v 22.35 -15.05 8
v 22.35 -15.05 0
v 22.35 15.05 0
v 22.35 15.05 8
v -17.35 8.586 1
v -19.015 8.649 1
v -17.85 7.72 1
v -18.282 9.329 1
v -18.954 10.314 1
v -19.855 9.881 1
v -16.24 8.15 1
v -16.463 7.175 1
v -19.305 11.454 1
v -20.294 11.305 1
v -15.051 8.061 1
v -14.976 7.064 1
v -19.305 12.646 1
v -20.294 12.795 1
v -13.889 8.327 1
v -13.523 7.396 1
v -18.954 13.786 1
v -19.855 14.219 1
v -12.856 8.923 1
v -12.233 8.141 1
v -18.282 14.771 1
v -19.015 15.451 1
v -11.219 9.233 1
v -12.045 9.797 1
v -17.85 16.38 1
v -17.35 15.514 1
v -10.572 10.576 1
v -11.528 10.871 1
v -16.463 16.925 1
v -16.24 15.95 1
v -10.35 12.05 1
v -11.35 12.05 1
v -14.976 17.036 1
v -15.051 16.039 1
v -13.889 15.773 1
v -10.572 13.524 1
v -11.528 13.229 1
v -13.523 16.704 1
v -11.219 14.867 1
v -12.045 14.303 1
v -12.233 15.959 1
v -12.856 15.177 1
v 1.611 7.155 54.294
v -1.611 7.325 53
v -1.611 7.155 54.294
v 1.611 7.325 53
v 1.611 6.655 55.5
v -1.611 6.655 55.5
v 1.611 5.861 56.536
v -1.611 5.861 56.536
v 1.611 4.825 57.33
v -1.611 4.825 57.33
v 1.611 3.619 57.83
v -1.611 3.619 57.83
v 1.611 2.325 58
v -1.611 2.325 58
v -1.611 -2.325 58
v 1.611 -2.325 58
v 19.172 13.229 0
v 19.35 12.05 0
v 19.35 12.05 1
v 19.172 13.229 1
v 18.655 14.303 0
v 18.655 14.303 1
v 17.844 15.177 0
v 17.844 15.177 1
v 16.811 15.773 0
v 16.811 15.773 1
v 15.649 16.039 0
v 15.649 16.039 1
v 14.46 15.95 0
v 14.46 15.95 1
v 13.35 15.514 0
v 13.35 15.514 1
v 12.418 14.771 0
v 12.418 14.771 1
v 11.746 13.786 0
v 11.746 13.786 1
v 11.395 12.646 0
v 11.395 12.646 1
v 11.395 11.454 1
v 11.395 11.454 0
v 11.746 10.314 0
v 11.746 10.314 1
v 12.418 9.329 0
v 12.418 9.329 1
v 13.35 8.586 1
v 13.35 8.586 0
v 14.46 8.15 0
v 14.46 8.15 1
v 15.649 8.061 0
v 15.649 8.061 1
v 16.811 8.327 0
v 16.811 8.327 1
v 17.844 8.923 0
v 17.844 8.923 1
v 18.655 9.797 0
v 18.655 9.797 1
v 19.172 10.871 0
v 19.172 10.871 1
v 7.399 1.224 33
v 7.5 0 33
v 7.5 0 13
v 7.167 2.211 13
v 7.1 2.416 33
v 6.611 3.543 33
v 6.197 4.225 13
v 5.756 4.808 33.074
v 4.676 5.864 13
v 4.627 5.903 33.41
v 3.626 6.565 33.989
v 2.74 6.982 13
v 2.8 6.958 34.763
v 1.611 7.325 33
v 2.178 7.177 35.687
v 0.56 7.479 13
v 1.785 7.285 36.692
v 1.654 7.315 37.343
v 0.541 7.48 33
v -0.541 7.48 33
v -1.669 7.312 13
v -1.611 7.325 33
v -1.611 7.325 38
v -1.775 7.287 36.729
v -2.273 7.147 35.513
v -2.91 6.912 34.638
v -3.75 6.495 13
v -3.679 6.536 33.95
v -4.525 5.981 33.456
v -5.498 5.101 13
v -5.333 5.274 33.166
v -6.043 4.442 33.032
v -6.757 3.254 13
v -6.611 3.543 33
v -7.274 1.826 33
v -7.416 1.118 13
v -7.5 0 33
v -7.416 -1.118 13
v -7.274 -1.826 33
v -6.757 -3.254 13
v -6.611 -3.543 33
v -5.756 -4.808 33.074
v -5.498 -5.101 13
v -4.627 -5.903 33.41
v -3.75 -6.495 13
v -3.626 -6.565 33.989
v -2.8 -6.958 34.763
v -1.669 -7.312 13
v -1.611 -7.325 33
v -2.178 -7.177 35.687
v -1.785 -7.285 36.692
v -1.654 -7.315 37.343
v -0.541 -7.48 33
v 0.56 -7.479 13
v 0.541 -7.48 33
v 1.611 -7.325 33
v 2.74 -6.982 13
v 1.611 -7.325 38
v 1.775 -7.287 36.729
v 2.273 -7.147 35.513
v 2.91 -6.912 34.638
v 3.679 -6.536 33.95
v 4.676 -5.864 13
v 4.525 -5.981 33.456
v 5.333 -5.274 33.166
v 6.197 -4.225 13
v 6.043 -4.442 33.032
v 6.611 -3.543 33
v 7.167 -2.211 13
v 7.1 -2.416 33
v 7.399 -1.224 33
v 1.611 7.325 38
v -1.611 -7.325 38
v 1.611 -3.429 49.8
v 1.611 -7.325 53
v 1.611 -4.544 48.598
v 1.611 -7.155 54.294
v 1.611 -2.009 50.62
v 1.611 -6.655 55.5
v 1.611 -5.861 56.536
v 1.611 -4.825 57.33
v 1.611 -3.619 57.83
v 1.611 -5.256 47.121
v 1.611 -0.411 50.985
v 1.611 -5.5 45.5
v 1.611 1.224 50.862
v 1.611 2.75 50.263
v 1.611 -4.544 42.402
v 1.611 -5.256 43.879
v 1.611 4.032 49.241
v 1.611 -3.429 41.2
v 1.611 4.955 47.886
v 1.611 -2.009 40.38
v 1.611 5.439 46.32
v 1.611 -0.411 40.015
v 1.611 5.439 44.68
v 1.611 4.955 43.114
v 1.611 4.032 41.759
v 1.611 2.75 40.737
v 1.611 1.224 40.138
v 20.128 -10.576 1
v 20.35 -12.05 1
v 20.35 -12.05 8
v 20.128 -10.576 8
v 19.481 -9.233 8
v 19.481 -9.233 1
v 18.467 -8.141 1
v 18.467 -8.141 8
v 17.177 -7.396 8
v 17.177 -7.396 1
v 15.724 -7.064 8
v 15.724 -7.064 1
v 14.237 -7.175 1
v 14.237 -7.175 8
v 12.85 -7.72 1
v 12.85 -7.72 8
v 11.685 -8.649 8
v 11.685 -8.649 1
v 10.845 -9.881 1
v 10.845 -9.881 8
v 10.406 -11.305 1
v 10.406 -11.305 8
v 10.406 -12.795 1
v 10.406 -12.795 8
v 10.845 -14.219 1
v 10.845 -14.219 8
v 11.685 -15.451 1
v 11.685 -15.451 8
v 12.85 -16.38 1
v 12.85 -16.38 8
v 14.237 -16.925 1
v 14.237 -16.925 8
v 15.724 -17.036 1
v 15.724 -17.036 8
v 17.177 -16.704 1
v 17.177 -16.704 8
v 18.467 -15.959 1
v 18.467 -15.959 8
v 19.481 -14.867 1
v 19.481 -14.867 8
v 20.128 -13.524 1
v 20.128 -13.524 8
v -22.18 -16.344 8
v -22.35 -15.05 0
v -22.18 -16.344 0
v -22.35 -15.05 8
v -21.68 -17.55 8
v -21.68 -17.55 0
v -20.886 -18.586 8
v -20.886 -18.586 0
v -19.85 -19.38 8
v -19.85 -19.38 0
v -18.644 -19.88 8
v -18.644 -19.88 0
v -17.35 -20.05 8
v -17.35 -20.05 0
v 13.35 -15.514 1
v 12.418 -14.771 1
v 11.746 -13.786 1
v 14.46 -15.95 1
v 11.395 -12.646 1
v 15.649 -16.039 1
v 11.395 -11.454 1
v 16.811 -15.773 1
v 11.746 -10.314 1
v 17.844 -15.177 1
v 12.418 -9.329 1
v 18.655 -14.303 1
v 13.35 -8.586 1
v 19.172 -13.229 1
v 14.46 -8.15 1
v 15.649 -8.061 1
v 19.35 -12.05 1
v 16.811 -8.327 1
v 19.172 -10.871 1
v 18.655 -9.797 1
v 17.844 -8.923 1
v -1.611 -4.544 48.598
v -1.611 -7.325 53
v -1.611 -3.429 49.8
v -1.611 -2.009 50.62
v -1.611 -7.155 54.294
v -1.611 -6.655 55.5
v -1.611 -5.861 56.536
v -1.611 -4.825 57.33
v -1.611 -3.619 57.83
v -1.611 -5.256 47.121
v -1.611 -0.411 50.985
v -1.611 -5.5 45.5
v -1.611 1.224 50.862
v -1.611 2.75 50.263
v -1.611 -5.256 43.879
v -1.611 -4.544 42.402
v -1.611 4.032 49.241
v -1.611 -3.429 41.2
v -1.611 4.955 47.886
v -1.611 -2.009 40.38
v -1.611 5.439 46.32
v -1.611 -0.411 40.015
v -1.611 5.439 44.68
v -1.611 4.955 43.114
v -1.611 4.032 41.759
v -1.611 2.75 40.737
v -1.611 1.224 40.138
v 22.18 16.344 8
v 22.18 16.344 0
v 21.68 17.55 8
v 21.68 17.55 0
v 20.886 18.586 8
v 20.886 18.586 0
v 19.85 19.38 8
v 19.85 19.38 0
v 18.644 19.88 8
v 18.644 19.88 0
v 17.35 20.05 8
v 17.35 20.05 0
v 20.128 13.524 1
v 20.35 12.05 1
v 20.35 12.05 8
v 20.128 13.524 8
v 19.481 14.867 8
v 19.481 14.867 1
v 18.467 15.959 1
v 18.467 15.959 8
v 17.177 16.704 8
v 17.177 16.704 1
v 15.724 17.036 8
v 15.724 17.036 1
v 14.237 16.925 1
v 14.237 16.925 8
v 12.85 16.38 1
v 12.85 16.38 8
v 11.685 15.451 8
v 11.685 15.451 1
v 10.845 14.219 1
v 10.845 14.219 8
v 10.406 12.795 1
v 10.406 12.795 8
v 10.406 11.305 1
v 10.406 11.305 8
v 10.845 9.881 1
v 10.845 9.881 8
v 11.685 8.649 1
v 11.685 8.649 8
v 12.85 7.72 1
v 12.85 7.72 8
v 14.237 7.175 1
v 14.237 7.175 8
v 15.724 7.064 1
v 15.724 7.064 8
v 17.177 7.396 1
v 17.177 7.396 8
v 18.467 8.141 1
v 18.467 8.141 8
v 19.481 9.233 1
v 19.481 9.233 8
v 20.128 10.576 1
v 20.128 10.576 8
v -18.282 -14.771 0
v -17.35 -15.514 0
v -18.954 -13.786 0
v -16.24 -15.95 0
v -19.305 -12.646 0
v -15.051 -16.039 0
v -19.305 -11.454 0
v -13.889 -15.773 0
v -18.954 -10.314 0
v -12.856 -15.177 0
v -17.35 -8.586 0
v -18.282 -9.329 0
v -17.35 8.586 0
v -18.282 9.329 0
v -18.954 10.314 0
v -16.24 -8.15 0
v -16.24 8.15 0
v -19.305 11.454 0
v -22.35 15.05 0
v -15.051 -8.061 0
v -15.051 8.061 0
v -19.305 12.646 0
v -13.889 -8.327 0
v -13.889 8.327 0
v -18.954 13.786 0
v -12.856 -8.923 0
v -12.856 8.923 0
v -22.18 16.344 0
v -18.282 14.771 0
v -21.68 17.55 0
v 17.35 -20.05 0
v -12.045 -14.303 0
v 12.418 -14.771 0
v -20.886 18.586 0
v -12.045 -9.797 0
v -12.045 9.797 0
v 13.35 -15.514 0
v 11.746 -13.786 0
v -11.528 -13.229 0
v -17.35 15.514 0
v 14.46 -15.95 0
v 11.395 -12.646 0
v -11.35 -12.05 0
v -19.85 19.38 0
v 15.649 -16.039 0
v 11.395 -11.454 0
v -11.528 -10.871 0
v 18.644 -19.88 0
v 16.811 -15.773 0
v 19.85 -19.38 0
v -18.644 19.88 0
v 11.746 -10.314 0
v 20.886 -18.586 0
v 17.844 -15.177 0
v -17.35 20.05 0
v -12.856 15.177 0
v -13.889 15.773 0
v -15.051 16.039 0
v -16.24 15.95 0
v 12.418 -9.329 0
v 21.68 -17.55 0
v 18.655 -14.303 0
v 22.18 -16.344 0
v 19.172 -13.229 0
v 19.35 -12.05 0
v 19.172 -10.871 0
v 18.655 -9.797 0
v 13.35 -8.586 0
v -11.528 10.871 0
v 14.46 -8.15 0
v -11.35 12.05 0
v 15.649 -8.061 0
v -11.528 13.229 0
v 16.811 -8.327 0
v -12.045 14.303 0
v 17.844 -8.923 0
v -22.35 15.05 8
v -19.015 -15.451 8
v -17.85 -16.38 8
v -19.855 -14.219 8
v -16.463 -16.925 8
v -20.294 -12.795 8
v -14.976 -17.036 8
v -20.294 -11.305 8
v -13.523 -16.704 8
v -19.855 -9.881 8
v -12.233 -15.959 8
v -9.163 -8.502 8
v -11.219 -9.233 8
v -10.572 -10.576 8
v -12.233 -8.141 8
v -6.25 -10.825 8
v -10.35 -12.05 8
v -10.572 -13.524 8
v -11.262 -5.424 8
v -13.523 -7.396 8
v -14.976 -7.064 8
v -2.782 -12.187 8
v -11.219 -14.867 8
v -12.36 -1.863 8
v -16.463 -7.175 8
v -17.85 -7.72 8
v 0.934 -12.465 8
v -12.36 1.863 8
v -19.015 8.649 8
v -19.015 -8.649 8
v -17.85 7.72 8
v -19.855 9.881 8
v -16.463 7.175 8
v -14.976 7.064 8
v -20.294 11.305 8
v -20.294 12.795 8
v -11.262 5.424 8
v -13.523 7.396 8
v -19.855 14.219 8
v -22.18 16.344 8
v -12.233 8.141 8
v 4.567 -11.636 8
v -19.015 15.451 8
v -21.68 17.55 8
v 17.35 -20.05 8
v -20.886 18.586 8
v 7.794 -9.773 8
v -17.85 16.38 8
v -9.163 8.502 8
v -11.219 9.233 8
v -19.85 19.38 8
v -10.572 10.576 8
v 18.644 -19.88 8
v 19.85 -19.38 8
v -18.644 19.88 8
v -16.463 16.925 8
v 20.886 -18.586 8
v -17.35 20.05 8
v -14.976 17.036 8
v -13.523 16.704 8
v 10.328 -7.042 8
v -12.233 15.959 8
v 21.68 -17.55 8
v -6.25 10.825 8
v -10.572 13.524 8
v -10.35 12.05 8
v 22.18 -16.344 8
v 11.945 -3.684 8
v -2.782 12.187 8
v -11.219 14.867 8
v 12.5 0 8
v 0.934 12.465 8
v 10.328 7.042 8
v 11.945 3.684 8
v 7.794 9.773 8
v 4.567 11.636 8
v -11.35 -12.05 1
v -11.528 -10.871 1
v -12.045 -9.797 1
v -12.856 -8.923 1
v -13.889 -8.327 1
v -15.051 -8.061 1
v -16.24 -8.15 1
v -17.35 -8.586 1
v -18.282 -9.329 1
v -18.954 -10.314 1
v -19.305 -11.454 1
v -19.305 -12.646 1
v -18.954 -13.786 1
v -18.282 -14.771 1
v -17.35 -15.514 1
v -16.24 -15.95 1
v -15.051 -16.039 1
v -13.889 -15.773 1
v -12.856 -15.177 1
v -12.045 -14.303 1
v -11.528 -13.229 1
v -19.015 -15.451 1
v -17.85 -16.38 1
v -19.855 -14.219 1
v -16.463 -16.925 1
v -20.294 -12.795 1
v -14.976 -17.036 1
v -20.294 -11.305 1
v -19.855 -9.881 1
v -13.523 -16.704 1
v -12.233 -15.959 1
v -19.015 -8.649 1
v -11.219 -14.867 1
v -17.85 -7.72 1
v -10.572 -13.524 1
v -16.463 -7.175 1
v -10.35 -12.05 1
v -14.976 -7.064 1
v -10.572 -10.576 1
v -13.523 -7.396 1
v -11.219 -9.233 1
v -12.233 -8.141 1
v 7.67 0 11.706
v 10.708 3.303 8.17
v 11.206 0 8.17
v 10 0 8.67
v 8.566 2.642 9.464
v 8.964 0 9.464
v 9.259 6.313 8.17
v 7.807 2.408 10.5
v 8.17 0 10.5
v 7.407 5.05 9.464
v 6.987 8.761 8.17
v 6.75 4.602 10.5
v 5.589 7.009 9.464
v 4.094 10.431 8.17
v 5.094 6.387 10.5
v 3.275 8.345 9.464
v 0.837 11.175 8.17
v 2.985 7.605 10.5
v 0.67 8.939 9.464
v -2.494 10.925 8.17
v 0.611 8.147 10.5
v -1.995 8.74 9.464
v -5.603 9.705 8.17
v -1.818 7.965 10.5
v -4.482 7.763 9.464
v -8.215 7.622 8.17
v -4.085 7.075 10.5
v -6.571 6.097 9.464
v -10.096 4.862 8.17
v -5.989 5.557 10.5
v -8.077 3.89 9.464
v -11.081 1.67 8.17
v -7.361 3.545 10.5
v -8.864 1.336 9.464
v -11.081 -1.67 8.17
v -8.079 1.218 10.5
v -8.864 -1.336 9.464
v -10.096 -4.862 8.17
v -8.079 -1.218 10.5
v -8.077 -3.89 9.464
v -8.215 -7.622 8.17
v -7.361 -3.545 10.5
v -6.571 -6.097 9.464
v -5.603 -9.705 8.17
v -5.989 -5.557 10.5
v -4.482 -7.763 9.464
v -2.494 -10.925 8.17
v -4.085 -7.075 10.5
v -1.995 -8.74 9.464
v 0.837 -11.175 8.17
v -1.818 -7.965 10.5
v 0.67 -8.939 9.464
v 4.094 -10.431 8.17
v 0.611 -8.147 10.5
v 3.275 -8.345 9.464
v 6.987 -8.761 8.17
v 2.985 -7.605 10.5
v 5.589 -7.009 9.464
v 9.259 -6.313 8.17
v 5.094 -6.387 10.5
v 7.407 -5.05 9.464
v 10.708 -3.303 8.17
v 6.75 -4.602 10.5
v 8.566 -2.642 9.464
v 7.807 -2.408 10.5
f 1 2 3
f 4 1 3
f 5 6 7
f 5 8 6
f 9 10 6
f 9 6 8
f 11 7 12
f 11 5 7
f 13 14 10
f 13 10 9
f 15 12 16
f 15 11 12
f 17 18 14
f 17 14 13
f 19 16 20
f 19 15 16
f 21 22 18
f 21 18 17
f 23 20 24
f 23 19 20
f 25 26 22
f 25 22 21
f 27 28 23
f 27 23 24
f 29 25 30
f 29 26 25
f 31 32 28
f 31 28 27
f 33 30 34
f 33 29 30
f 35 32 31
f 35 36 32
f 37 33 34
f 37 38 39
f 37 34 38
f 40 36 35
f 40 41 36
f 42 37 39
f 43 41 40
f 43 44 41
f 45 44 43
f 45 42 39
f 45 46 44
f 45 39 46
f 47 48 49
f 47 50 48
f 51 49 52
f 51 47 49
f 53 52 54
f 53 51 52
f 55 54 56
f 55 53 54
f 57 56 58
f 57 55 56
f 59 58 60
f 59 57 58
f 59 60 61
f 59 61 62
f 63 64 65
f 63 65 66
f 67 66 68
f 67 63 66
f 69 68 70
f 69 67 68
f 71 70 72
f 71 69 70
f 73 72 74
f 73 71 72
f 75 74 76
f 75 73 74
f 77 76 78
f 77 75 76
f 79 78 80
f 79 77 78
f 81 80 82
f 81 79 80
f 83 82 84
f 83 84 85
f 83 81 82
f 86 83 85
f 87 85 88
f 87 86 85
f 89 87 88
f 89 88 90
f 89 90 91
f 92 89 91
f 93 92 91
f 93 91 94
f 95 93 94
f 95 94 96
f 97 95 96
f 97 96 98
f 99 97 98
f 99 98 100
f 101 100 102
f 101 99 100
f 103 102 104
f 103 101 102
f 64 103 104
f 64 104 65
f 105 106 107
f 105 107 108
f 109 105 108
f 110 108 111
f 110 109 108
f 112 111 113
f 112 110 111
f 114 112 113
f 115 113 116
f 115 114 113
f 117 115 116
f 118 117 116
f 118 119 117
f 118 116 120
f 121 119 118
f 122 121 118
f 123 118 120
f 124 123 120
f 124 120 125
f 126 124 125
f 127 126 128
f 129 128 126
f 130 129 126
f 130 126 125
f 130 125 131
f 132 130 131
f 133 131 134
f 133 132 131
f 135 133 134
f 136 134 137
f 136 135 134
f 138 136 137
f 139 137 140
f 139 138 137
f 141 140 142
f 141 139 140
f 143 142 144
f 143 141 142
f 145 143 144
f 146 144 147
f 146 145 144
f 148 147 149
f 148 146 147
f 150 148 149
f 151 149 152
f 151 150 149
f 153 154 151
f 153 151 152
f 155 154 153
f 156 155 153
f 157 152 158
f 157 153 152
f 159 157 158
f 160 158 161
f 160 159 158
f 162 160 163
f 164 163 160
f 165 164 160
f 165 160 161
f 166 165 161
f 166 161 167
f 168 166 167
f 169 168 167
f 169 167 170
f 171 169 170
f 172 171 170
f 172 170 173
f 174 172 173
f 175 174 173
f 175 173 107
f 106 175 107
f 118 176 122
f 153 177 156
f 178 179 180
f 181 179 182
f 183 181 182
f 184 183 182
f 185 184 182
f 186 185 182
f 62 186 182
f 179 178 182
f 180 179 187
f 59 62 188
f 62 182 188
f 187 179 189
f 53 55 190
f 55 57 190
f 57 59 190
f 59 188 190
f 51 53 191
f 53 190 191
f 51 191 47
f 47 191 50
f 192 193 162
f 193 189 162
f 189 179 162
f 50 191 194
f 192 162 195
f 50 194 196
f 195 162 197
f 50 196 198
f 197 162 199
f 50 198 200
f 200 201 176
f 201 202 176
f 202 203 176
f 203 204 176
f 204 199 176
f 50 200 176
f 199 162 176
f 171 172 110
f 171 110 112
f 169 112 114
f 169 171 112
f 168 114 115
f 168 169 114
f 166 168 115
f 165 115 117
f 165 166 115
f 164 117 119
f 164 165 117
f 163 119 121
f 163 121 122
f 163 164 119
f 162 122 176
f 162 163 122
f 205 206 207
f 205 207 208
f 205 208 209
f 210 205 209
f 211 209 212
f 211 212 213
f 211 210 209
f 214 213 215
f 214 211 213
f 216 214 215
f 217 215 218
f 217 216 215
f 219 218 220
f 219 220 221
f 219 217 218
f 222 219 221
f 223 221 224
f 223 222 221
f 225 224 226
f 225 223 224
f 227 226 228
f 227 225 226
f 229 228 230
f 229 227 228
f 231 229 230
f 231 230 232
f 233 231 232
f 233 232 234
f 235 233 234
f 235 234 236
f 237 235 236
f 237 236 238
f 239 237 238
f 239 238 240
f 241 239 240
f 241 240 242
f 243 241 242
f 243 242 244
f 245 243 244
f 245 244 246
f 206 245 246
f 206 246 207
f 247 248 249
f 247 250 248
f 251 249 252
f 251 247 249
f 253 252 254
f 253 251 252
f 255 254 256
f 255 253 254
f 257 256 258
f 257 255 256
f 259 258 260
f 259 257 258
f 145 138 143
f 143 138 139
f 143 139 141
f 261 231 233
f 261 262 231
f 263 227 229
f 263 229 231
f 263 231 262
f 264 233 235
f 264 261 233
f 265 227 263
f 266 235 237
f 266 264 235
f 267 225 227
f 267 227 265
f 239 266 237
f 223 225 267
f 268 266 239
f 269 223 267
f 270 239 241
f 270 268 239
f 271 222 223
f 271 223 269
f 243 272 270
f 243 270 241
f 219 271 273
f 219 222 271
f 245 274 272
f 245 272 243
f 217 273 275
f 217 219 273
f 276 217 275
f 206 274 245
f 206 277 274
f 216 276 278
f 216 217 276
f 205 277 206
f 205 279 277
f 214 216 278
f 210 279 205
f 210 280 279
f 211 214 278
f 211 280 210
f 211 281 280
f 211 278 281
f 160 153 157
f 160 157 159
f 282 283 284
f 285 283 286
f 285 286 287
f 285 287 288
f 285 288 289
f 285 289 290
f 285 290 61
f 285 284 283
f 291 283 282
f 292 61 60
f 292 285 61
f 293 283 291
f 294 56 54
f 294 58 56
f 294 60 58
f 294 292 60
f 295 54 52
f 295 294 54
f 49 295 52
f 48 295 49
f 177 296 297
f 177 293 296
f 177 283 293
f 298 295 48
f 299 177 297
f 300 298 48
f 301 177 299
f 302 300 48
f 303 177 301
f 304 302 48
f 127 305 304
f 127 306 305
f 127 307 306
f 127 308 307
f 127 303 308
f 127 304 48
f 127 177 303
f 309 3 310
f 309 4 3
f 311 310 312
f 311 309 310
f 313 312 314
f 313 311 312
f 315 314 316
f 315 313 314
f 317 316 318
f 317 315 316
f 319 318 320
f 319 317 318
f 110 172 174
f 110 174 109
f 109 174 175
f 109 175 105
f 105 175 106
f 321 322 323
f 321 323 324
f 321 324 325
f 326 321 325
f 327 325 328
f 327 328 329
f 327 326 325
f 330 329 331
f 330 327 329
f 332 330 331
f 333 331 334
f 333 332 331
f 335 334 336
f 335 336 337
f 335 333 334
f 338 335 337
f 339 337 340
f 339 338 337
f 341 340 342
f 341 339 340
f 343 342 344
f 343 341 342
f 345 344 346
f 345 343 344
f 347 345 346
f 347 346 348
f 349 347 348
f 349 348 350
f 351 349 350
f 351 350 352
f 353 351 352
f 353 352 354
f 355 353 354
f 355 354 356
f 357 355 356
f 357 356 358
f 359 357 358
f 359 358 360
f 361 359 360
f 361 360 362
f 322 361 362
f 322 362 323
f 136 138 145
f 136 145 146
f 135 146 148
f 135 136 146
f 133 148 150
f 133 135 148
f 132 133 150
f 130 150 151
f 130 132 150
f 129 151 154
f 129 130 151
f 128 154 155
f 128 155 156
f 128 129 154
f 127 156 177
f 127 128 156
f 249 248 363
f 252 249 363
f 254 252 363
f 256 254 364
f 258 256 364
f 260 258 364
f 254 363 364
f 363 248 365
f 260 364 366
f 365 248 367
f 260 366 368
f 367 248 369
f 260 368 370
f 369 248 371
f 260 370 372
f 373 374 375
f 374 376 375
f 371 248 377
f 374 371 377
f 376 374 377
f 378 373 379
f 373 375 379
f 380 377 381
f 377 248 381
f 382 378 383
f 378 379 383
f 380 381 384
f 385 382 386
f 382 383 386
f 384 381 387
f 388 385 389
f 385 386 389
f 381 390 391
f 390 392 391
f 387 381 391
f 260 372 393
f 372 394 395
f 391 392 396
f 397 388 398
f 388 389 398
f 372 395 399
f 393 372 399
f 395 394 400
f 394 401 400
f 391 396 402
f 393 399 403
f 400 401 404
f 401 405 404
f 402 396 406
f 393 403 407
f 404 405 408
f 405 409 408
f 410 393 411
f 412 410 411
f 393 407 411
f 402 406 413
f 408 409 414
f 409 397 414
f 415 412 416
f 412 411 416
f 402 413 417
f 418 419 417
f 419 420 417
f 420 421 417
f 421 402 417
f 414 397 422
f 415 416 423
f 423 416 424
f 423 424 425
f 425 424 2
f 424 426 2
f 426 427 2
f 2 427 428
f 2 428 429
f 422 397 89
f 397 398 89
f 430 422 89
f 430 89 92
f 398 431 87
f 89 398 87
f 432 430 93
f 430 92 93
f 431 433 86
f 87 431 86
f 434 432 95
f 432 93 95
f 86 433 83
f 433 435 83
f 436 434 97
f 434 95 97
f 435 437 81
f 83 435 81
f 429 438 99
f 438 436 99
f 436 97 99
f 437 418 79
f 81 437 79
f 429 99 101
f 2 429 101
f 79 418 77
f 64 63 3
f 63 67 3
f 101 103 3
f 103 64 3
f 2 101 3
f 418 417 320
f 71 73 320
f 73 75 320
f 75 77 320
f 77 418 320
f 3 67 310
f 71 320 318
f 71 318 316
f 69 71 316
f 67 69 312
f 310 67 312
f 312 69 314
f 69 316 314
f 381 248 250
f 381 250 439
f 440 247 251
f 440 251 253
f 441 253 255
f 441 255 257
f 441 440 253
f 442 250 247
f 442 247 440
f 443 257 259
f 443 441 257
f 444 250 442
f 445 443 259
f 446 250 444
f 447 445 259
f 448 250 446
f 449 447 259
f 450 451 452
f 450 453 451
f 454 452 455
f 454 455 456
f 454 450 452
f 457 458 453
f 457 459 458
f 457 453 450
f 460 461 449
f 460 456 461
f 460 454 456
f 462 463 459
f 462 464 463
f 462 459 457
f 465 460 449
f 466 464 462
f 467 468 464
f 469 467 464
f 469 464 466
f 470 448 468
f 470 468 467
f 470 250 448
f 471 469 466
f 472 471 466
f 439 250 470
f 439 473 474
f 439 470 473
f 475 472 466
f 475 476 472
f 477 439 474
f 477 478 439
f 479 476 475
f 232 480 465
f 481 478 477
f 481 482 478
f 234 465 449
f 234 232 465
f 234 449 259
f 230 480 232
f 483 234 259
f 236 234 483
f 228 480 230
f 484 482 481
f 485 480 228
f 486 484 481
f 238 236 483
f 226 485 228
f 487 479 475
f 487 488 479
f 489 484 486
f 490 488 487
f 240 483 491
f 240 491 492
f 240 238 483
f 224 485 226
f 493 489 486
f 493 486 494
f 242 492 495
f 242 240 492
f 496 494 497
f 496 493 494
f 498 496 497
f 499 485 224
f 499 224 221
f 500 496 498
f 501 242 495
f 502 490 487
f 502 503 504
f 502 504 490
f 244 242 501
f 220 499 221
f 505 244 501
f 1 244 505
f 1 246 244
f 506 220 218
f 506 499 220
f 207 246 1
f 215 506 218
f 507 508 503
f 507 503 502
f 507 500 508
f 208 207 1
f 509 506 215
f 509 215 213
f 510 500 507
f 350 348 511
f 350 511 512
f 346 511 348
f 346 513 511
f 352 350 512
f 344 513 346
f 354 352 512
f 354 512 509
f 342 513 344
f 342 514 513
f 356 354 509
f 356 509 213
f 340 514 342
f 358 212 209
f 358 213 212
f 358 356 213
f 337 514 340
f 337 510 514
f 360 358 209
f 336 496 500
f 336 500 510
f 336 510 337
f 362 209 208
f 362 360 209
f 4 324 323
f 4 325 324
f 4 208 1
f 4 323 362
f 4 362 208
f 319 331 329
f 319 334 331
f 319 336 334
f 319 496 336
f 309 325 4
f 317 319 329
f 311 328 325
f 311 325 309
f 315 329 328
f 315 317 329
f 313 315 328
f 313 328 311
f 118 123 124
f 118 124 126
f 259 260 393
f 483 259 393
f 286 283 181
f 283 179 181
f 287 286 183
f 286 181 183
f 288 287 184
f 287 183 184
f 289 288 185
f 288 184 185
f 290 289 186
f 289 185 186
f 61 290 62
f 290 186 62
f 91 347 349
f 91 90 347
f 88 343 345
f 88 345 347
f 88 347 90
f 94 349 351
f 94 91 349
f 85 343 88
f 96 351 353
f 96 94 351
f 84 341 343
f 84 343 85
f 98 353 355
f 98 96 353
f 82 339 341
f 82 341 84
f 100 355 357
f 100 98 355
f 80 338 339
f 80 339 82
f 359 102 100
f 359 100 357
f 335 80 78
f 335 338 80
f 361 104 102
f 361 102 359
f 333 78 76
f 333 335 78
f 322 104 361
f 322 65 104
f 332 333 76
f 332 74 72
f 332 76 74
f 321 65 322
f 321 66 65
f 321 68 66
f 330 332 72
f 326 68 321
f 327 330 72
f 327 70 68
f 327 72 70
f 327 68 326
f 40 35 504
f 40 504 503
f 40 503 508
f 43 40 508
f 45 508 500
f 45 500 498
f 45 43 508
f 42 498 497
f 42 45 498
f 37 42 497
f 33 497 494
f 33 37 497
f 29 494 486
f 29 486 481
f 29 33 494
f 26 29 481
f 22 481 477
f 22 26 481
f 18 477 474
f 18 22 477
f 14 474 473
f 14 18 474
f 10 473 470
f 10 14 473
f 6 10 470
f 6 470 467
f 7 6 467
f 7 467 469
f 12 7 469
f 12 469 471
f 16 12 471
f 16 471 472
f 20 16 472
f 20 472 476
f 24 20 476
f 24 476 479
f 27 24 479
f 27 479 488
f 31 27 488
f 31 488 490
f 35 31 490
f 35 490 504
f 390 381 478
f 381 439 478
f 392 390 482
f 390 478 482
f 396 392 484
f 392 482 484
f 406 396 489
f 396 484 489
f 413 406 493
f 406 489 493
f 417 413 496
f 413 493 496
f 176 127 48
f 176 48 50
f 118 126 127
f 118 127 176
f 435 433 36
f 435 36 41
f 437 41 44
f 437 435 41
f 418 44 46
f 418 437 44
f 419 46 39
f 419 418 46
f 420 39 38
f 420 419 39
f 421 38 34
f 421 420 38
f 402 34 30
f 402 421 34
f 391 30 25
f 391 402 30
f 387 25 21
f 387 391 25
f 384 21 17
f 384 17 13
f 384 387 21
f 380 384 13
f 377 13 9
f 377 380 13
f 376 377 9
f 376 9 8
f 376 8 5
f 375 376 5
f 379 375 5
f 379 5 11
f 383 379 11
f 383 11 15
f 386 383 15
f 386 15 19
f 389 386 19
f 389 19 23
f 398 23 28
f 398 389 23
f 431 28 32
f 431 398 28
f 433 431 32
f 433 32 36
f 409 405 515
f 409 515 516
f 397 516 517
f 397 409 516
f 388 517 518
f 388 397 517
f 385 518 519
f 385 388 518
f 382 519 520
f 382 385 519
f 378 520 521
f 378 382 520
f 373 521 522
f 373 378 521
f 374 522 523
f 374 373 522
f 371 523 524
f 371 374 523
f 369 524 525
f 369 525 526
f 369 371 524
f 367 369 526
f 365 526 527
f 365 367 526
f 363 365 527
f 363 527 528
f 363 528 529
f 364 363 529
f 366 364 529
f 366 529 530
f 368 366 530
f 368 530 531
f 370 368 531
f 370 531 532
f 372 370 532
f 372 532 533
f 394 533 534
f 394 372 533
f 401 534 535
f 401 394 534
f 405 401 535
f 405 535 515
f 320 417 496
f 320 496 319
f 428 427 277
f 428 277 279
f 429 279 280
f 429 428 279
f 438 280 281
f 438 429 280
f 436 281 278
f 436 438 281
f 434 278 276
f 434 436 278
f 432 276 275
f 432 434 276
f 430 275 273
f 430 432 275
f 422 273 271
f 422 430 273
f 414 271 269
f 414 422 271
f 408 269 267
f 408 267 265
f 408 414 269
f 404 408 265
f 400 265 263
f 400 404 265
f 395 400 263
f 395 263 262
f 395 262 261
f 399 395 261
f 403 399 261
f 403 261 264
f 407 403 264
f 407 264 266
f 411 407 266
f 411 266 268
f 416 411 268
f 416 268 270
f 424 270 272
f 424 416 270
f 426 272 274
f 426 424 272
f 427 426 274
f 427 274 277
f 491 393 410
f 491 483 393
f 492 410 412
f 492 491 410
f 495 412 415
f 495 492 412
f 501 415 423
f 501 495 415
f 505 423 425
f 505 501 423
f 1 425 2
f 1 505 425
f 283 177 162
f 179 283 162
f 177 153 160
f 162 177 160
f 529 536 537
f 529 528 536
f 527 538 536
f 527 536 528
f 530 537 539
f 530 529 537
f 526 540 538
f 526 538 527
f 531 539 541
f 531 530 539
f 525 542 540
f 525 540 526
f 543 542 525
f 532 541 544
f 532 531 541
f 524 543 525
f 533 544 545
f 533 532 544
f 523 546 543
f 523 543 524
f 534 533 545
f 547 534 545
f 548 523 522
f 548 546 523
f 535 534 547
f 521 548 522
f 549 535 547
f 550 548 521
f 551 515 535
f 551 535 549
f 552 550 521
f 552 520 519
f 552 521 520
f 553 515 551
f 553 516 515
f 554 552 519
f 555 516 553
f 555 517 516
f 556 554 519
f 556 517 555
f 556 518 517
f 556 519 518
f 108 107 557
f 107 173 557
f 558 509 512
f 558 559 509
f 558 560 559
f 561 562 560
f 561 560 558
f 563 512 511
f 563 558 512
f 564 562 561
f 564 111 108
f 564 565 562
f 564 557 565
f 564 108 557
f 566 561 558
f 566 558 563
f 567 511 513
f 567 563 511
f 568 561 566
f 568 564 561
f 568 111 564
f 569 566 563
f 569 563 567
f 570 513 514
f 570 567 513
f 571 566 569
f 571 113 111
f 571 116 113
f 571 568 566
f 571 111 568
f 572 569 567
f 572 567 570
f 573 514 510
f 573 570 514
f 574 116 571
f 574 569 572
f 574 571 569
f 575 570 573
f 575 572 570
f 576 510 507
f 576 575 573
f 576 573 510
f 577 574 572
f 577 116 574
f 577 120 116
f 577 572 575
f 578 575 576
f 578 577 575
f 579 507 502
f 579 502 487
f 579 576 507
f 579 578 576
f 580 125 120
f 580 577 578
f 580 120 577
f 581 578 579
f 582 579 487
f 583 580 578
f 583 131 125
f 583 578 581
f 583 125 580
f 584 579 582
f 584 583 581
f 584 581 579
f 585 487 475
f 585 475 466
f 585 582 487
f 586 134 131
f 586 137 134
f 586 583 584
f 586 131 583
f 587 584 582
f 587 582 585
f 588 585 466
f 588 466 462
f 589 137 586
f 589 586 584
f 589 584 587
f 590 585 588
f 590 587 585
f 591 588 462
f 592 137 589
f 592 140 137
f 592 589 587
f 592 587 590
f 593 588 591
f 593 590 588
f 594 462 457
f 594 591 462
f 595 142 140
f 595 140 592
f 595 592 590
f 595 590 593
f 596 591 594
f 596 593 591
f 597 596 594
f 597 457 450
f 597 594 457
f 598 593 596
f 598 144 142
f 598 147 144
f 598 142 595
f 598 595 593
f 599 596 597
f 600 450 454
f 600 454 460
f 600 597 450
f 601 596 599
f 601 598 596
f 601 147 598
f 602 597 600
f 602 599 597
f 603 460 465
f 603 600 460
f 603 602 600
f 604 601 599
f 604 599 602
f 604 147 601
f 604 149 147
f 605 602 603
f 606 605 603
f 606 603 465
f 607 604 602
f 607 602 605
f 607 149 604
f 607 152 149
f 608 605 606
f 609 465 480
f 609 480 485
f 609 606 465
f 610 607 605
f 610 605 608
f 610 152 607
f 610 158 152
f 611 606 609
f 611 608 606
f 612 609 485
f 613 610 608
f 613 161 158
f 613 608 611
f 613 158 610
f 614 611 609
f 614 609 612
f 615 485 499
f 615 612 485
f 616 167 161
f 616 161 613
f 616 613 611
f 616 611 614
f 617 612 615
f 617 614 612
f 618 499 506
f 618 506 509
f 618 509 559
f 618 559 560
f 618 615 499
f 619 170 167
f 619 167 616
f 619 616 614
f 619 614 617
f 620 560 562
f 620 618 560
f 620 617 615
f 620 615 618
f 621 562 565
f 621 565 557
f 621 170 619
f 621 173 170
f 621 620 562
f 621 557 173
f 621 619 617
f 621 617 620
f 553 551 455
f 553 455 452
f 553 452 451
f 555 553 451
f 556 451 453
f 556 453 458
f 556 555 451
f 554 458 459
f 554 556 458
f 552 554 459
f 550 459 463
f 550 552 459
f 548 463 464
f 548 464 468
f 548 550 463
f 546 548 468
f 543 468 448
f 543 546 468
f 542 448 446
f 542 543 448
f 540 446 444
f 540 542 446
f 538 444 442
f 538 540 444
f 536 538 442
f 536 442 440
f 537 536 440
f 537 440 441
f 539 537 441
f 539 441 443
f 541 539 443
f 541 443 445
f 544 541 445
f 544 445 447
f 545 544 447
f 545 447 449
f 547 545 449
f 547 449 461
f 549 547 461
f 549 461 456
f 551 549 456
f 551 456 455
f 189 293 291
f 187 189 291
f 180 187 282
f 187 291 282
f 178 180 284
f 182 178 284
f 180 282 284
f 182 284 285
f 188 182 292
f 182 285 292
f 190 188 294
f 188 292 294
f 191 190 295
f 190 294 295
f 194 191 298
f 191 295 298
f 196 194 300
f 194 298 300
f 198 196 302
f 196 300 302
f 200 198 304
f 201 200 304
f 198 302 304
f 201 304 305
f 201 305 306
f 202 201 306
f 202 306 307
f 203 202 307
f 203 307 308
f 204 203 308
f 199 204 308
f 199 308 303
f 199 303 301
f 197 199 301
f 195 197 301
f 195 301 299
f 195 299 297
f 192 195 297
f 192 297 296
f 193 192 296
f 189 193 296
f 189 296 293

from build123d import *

# Parameters (mm, degrees)
F0_W          = 44.7
F0_H          = 40.1
F0_R          = 5
F1_DEPTH      = 8
F0_R_2        = 4
F2_DEPTH      = 1
F3_R          = 7.5
F4_DEPTH      = 25
F5_W          = 3.2212789527
F5_H          = 14.6500294167
F6_DEPTH      = 25
F7_R          = 5.5
F8_DEPTH      = 10
F9_R          = 5
F10_T4_DEPTH  = 14.6500294167
F10_S5_R      = 7.5
F10_T6_DEPTH  = 10
F10_T10_DEPTH = 14.6500294167
F10_S11_R     = 7.5
F10_T12_DEPTH = 10


# Not quite as in the source:
# - a fillet or chamfer that OpenCascade refuses, or shapes differently, is made with other operations: its cross-section is extruded or revolved along the edge and cut away or added


with BuildPart() as f1:
    # F0 (on Top) → F1 (new body)
    with BuildSketch(Plane.XY):
        Rectangle(F0_W, F0_H)
        with Locations((-15.35, -12.05)):
            Circle(F0_R, mode=Mode.SUBTRACT)
        with Locations((15.35, -12.05)):
            Circle(F0_R, mode=Mode.SUBTRACT)
        with Locations((-15.35, 12.05)):
            Circle(F0_R, mode=Mode.SUBTRACT)
        with Locations((15.35, 12.05)):
            Circle(F0_R, mode=Mode.SUBTRACT)
    extrude(amount=F1_DEPTH)

    # F0 (on Top) → F2 (join)
    with BuildSketch(Plane.XY):
        with Locations((15.35, 12.05)):
            Circle(F0_R)
        with Locations((15.35, 12.05)):
            Circle(F0_R_2, mode=Mode.SUBTRACT)
        with Locations((15.35, -12.05)):
            Circle(F0_R)
        with Locations((15.35, -12.05)):
            Circle(F0_R_2, mode=Mode.SUBTRACT)
        with Locations((-15.35, -12.05)):
            Circle(F0_R)
        with Locations((-15.35, -12.05)):
            Circle(F0_R_2, mode=Mode.SUBTRACT)
        with Locations((-15.35, 12.05)):
            Circle(F0_R)
        with Locations((-15.35, 12.05)):
            Circle(F0_R_2, mode=Mode.SUBTRACT)
    extrude(amount=F2_DEPTH)

    # F3 (on face) → F4 (join)
    with BuildSketch(Plane.XY.offset(8)):
        Circle(F3_R)
    extrude(amount=F4_DEPTH)

    # F5 (on face) → F6 (join)
    with BuildSketch(Plane.XY.offset(33)):
        Rectangle(F5_W, F5_H)
    extrude(amount=F6_DEPTH)

    # F7 (on face) → F8 (cut)
    with BuildSketch(Plane(origin=(-1.6106394764, 0, 0), x_dir=(0, -1, 0), z_dir=(-1, 0, 0))):
        with Locations((0, 45.5)):
            Circle(F7_R)
    extrude(amount=-F8_DEPTH, mode=Mode.SUBTRACT)

    # F9
    f9_edges = [f1.edges().sort_by_distance(p)[0] for p in [
        (0, 7.325015, 58),
        (0, -7.325015, 58),
        (-22.35, 20.05, 4),
        (-22.35, -20.05, 4),
        (22.35, -20.05, 4),
        (22.35, 20.05, 4),
    ]]
    fillet(f9_edges, radius=F9_R)

    # F10: fillet of radius 5 on 3 edges, made by hand


with BuildPart() as f10_tool2:
    # F10_s3 → F10_t4 (new body)
    with BuildSketch(Plane.XZ.offset(7.3250147083)):
        with BuildLine():
            ThreePointArc((6.6106394764, 33), (3.0751055704, 34.4644660941), (1.6106394764, 38))
            Line((1.6106394764, 38), (1.6106394764, 33))
            Line((1.6106394764, 33), (6.6106394764, 33))
        make_face()
    extrude(amount=-F10_T4_DEPTH)

    # F10_s5 → F10_t6 (intersect, symmetric)
    with BuildSketch(Plane.XY.offset(35.5)):
        Circle(F10_S5_R)
    extrude(amount=F10_T6_DEPTH, both=True, mode=Mode.INTERSECT)


with BuildPart() as f1_1:
    add(f1.part)

    # F10_t1: union F10_tool2
    add(f10_tool2.part)


with BuildPart() as f10_tool8:
    # F10_s9 → F10_t10 (new body)
    with BuildSketch(Plane.XZ.offset(-7.3250147083)):
        with BuildLine():
            ThreePointArc((-6.6106394764, 33), (-3.0751055704, 34.4644660941), (-1.6106394764, 38))
            Line((-1.6106394764, 38), (-1.6106394764, 33))
            Line((-1.6106394764, 33), (-6.6106394764, 33))
        make_face()
    extrude(amount=F10_T10_DEPTH)

    # F10_s11 → F10_t12 (intersect, symmetric)
    with BuildSketch(Plane.XY.offset(35.5)):
        Circle(F10_S11_R)
    extrude(amount=F10_T12_DEPTH, both=True, mode=Mode.INTERSECT)


with BuildPart() as f1_2:
    add(f1_1.part)

    # F10_t7: union F10_tool8
    add(f10_tool8.part)

    # F10_s13 → F10_t14 (revolve)
    with BuildSketch(Plane.XZ):
        with BuildLine():
            ThreePointArc((12.5, 8), (8.9644660941, 9.4644660941), (7.5, 13))
            Line((7.5, 13), (7.5, 8))
            Line((7.5, 8), (12.5, 8))
        make_face()
    revolve(axis=Axis((0, 0, 8), (0, 0, 1)))


solid = f1_2.part
